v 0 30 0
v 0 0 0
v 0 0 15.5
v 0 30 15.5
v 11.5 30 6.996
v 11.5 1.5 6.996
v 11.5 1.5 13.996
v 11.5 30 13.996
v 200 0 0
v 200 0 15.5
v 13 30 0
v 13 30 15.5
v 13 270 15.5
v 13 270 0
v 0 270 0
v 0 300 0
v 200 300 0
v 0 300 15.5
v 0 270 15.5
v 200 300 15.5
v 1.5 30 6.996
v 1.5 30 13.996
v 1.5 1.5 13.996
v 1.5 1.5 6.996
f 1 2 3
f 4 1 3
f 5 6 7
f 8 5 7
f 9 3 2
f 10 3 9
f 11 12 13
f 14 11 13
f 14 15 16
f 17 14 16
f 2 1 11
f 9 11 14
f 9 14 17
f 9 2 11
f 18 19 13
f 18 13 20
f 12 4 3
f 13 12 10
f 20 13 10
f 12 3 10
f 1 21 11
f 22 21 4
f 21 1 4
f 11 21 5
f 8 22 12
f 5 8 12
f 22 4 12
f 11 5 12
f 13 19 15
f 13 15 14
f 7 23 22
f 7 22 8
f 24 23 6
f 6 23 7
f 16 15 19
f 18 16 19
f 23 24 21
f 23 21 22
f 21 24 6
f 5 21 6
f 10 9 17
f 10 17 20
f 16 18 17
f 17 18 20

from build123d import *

# Parameters (mm, degrees)
F0_W     = 200
F0_H     = 15.5
F1_DEPTH = 300
F2_W     = 13
F2_H     = 120
F3_DEPTH = 15.501
F5_W     = 10
F5_H     = 7
F6_DEPTH = 28.5


with BuildPart() as f1:
    # F0 (on Front) → F1 (new body)
    with BuildSketch(Plane.XZ):
        with Locations((100, 7.75)):
            Rectangle(F0_W, F0_H)
    extrude(amount=-F1_DEPTH)

    # F2 (on face) → F3 (cut, through all)
    with BuildSketch(Plane.XY.offset(15.5)):
        with Locations((6.5, 210)):
            Rectangle(F2_W, F2_H)
        with Locations((6.5, 90)):
            Rectangle(F2_W, F2_H)
    extrude(amount=-F3_DEPTH, mode=Mode.SUBTRACT)

    # F5 (on offset) → F6 (cut, through all)
    with BuildSketch(Plane.XZ.offset(-1.5)):
        with Locations((6.5, 10.4964849353)):
            Rectangle(F5_W, F5_H)
    extrude(amount=-F6_DEPTH, mode=Mode.SUBTRACT)


solid = f1.part
